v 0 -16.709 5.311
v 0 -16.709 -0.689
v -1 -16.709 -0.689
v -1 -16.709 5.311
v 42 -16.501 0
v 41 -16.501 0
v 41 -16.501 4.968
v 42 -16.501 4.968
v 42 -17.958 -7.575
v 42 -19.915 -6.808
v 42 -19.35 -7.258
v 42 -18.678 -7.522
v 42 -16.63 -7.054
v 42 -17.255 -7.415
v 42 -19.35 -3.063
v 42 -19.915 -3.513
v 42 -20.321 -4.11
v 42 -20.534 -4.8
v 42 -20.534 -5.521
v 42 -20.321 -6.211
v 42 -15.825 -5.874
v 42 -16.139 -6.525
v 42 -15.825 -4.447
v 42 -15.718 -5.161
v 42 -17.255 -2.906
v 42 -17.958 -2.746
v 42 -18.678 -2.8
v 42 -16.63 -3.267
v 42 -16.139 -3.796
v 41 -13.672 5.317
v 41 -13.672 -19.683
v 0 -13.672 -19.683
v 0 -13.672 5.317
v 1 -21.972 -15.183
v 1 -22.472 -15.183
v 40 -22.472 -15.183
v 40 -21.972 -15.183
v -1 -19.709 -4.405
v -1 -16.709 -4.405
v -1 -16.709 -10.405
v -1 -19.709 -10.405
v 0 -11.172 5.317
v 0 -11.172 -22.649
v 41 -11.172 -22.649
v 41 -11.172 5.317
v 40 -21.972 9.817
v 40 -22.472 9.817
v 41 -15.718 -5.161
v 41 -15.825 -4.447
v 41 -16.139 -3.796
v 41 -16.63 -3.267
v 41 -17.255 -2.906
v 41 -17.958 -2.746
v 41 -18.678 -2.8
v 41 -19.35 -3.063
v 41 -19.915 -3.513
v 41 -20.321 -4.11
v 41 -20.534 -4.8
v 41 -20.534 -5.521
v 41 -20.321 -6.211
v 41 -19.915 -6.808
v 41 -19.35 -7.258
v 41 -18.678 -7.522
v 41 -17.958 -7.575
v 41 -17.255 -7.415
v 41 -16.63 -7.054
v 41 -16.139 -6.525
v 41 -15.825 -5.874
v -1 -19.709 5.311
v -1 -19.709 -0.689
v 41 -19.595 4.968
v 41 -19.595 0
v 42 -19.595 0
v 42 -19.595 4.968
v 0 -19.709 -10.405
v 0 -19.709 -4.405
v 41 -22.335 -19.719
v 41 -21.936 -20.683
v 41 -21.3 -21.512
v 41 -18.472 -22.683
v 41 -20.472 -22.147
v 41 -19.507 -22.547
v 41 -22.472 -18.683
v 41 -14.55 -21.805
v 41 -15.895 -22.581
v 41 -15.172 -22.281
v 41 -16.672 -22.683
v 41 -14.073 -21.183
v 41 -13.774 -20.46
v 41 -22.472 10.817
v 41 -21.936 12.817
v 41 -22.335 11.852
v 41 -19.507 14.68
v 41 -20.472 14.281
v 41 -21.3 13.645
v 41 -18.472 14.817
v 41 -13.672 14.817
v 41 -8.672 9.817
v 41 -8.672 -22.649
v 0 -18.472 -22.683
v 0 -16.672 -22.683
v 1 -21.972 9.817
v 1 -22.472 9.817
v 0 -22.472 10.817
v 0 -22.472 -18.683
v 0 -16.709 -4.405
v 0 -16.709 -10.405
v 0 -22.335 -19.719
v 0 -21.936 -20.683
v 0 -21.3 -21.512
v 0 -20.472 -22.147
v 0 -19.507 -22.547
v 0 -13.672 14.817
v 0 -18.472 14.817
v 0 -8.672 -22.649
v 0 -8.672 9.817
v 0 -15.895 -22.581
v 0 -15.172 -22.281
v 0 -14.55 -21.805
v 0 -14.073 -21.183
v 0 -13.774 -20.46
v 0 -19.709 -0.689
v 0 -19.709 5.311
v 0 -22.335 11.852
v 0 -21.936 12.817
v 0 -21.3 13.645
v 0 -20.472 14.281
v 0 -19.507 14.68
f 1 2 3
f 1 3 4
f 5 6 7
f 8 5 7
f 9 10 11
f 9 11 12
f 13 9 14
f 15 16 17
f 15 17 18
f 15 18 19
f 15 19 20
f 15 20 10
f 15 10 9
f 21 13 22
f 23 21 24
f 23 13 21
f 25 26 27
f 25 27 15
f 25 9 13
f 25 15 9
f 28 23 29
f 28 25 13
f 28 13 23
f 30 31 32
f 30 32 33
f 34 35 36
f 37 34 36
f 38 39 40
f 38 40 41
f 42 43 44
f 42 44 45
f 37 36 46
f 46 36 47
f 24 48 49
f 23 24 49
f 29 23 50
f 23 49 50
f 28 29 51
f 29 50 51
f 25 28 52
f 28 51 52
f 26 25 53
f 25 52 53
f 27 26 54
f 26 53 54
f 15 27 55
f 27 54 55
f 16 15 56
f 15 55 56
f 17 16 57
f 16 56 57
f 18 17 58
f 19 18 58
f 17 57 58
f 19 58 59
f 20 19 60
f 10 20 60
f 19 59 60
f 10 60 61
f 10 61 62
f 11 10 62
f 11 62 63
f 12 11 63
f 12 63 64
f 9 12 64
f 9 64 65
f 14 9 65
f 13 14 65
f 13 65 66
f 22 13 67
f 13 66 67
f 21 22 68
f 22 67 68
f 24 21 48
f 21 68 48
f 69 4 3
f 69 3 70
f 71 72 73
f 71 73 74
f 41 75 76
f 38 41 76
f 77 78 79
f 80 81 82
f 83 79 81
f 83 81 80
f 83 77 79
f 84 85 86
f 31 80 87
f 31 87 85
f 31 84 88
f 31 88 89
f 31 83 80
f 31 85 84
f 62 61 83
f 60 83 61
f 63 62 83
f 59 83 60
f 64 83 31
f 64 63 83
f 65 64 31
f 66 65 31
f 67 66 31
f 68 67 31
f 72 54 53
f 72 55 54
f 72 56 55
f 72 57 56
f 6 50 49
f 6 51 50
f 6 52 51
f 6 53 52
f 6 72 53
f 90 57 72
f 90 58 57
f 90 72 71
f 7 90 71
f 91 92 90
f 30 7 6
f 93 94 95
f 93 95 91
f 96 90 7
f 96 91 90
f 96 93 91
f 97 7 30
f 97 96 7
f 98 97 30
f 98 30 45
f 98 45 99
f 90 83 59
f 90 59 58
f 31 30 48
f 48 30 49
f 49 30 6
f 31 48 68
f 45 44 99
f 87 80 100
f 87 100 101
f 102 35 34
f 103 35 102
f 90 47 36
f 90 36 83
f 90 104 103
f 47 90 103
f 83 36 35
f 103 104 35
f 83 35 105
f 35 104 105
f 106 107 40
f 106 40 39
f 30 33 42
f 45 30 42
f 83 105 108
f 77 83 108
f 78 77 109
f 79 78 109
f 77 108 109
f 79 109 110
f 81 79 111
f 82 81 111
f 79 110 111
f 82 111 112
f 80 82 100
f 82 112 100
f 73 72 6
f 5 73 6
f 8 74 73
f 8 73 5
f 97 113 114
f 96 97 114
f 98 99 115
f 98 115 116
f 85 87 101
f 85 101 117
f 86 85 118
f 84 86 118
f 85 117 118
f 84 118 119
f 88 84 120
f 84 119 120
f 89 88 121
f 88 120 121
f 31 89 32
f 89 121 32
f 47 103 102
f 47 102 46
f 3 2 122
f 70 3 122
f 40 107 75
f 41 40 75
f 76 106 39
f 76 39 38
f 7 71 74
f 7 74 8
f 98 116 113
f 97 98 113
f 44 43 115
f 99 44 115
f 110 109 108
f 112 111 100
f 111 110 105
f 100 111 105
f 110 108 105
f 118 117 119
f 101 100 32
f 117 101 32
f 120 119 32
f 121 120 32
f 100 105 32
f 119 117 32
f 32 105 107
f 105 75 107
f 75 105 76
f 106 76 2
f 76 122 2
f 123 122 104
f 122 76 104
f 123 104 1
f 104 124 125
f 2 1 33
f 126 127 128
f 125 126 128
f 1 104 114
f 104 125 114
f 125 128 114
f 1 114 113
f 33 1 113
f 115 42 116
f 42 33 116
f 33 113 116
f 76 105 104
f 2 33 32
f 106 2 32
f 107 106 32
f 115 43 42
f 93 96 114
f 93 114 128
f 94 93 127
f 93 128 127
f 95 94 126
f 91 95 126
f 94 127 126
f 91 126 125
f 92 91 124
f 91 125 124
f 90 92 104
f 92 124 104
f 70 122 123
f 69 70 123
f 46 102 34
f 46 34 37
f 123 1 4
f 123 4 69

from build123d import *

# Parameters (mm, degrees)
F0_W     = 2.5
F0_H     = 27.965406
F1_DEPTH = 41
F2_W     = 3.093319
F2_H     = 4.968024
F2_R     = 2.421667
F3_DEPTH = 1
F4_W     = 3
F4_H     = 6
F5_DEPTH = 1
F6_W     = 39
F6_H     = 25
F7_DEPTH = 0.5


with BuildPart() as f1:
    # F0 (on Right) → F1 (new body)
    with BuildSketch(Plane.YZ):
        with BuildLine():
            Line((-13.671529, 14.816766), (-18.471529, 14.816766))
            ThreePointArc((-18.471529, 14.816766), (-21.299956, 13.645193), (-22.471529, 10.816766))
            Line((-22.471529, 10.816766), (-22.471529, -18.683234))
            ThreePointArc((-22.471529, -18.683234), (-21.299956, -21.511661), (-18.471529, -22.683234))
            Line((-18.471529, -22.683234), (-16.671529, -22.683234))
            ThreePointArc((-16.671529, -22.683234), (-14.550208, -21.804554), (-13.671529, -19.683234))
            Line((-13.671529, -19.683234), (-13.671529, 5.316766))
            Line((-13.671529, 5.316766), (-13.671529, 9.816766))
            Line((-13.671529, 9.816766), (-13.671529, 14.816766))
        make_face()
        Polygon((-8.671529, 9.816766), (-13.671529, 9.816766), (-13.671529, 5.316766), (-11.171529, 5.316766), (-8.671529, 5.316766), align=None)
        Polygon((-8.671529, 9.816766), (-13.671529, 14.816766), (-13.671529, 9.816766), align=None)
        with Locations((-9.921529, -8.665937)):
            Rectangle(F0_W, F0_H)
    extrude(amount=F1_DEPTH)

    # F2 (on face) → F3 (join)
    with BuildSketch(Plane.YZ.offset(41)):
        with Locations((-18.047974, 2.484012)):
            Rectangle(F2_W, F2_H)
        with Locations((-18.139437, -5.160558)):
            Circle(F2_R)
    extrude(amount=F3_DEPTH)

    # F4 (on face) → F5 (join)
    with BuildSketch(Plane(origin=(0, 0, 0), x_dir=(0, -1, 0), z_dir=(-1, 0, 0))):
        with Locations((18.208981, 2.310598)):
            Rectangle(F4_W, F4_H)
        with Locations((18.208981, -7.405368)):
            Rectangle(F4_W, F4_H)
    extrude(amount=F5_DEPTH)

    # F6 (on face) → F7 (cut)
    with BuildSketch(Plane.XZ.offset(22.471529)):
        with Locations((20.5, -2.683234)):
            Rectangle(F6_W, F6_H)
    extrude(amount=-F7_DEPTH, mode=Mode.SUBTRACT)


solid = f1.part
